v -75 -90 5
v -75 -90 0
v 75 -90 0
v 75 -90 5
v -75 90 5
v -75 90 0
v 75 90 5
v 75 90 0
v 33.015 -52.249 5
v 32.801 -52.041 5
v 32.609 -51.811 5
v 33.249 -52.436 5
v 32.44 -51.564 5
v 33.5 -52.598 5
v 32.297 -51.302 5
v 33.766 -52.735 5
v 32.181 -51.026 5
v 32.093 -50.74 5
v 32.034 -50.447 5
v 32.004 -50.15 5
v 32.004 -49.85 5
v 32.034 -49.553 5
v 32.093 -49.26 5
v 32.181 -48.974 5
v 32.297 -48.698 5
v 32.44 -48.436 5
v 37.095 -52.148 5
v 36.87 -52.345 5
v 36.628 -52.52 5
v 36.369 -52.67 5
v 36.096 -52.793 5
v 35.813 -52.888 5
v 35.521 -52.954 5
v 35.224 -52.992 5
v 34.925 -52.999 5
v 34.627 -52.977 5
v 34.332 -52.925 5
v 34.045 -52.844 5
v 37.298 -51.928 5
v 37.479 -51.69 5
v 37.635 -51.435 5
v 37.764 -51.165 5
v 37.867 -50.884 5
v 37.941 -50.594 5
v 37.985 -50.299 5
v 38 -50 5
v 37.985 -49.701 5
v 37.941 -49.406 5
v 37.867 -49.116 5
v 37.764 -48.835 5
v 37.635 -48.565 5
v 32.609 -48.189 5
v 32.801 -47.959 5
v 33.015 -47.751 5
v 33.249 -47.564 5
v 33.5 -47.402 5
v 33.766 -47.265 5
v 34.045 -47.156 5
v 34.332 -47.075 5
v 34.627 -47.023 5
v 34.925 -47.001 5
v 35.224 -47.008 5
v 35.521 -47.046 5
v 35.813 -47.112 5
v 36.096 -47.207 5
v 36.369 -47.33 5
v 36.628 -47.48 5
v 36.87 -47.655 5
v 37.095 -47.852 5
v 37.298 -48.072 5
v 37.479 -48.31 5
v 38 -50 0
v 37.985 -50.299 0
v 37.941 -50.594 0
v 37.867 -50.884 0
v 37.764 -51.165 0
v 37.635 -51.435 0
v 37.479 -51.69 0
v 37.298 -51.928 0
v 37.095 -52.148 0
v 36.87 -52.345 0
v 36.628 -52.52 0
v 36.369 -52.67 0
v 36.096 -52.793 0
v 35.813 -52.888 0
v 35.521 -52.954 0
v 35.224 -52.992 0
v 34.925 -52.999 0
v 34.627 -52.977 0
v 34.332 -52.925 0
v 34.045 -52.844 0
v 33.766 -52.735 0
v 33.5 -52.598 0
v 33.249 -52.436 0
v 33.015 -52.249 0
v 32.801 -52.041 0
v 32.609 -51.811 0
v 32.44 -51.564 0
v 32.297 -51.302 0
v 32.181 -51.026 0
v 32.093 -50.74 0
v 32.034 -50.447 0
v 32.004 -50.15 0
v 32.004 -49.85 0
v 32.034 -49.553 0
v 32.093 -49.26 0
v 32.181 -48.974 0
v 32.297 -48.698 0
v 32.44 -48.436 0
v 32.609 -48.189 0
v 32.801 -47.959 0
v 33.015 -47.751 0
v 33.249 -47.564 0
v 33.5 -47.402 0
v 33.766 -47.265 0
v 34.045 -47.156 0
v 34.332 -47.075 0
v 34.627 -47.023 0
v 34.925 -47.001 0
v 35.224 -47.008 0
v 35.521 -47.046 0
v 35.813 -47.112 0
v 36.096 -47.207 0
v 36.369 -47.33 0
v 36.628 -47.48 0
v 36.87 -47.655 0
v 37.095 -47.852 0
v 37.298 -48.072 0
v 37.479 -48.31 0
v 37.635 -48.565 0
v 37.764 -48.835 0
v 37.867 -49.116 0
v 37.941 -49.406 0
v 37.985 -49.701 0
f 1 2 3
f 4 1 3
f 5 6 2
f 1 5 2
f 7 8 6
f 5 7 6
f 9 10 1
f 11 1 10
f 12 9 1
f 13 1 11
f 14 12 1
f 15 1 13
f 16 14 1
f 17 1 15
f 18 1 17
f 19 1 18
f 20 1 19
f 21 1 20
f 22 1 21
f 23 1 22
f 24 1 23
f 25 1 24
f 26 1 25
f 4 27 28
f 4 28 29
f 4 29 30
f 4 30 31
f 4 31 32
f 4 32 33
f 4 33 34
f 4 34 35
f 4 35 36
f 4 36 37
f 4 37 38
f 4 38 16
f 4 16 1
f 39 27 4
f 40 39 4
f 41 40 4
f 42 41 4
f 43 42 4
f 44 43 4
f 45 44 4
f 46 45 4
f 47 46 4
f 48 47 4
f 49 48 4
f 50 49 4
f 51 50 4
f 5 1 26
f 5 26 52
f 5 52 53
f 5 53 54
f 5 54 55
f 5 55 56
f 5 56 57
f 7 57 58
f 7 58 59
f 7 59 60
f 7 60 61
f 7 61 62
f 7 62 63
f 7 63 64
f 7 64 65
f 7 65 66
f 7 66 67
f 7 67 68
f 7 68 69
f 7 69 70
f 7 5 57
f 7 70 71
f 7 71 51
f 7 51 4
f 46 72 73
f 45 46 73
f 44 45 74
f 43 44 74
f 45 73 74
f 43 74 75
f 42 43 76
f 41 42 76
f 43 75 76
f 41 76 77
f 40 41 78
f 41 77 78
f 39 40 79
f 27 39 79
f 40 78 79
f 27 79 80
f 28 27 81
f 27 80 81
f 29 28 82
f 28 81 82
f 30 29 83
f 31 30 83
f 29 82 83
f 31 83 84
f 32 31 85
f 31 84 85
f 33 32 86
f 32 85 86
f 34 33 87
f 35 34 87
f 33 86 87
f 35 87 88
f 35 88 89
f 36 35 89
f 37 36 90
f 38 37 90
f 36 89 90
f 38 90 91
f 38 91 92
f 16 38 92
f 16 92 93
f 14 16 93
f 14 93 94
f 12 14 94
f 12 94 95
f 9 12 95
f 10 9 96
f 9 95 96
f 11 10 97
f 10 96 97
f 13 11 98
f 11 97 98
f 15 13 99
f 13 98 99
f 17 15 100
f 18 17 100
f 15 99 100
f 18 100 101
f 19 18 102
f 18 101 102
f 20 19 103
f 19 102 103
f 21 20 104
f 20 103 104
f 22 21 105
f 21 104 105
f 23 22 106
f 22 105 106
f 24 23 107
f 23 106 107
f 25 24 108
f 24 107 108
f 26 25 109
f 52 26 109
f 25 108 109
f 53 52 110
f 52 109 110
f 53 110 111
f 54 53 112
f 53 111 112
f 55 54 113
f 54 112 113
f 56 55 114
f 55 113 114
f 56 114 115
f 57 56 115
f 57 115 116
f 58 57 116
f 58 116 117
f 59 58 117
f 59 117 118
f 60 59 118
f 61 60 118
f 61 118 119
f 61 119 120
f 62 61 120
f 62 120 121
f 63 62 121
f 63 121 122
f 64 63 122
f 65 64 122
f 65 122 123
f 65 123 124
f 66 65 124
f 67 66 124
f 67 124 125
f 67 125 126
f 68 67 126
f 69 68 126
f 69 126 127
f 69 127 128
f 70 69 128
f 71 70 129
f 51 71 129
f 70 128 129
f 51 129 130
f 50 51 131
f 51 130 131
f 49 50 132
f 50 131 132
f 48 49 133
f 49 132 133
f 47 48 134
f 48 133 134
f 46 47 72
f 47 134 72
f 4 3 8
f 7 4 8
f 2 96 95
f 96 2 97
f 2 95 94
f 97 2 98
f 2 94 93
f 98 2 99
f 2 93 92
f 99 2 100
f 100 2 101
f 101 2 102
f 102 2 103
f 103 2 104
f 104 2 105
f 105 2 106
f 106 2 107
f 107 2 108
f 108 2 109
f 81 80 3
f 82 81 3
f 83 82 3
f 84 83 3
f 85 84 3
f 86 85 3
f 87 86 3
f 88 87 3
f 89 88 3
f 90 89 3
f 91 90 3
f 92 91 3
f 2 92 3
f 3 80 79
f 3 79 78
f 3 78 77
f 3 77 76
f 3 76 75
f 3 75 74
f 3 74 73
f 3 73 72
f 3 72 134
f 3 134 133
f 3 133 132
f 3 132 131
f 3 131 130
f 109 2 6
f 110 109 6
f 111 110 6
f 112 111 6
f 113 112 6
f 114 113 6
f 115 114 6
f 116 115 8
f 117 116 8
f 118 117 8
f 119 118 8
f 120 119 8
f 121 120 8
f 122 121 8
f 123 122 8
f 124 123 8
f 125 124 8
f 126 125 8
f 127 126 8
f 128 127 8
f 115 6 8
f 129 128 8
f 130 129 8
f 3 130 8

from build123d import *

# Parameters (mm, degrees)
BOSS_EXTRUDE1_DEPTH = 5


with BuildPart() as part:
    # Sketch1 → Boss-Extrude1 (new body)
    with BuildSketch(Plane.XY):
        with BuildLine():
            Line((38, -50), (75, -50))
            Line((75, -50), (75, 90))
            Line((75, 90), (-75, 90))
            Line((-75, 90), (-75, -50))
            Line((-75, -50), (32, -50))
            ThreePointArc((32, -50), (35, -47), (38, -50))
        make_face()
        with BuildLine():
            Line((-75, -90), (75, -90))
            Line((75, -90), (75, -50))
            Line((75, -50), (38, -50))
            ThreePointArc((38, -50), (35, -53), (32, -50))
            Line((32, -50), (-75, -50))
            Line((-75, -50), (-75, -90))
        make_face()
    extrude(amount=BOSS_EXTRUDE1_DEPTH)


solid = part.part
